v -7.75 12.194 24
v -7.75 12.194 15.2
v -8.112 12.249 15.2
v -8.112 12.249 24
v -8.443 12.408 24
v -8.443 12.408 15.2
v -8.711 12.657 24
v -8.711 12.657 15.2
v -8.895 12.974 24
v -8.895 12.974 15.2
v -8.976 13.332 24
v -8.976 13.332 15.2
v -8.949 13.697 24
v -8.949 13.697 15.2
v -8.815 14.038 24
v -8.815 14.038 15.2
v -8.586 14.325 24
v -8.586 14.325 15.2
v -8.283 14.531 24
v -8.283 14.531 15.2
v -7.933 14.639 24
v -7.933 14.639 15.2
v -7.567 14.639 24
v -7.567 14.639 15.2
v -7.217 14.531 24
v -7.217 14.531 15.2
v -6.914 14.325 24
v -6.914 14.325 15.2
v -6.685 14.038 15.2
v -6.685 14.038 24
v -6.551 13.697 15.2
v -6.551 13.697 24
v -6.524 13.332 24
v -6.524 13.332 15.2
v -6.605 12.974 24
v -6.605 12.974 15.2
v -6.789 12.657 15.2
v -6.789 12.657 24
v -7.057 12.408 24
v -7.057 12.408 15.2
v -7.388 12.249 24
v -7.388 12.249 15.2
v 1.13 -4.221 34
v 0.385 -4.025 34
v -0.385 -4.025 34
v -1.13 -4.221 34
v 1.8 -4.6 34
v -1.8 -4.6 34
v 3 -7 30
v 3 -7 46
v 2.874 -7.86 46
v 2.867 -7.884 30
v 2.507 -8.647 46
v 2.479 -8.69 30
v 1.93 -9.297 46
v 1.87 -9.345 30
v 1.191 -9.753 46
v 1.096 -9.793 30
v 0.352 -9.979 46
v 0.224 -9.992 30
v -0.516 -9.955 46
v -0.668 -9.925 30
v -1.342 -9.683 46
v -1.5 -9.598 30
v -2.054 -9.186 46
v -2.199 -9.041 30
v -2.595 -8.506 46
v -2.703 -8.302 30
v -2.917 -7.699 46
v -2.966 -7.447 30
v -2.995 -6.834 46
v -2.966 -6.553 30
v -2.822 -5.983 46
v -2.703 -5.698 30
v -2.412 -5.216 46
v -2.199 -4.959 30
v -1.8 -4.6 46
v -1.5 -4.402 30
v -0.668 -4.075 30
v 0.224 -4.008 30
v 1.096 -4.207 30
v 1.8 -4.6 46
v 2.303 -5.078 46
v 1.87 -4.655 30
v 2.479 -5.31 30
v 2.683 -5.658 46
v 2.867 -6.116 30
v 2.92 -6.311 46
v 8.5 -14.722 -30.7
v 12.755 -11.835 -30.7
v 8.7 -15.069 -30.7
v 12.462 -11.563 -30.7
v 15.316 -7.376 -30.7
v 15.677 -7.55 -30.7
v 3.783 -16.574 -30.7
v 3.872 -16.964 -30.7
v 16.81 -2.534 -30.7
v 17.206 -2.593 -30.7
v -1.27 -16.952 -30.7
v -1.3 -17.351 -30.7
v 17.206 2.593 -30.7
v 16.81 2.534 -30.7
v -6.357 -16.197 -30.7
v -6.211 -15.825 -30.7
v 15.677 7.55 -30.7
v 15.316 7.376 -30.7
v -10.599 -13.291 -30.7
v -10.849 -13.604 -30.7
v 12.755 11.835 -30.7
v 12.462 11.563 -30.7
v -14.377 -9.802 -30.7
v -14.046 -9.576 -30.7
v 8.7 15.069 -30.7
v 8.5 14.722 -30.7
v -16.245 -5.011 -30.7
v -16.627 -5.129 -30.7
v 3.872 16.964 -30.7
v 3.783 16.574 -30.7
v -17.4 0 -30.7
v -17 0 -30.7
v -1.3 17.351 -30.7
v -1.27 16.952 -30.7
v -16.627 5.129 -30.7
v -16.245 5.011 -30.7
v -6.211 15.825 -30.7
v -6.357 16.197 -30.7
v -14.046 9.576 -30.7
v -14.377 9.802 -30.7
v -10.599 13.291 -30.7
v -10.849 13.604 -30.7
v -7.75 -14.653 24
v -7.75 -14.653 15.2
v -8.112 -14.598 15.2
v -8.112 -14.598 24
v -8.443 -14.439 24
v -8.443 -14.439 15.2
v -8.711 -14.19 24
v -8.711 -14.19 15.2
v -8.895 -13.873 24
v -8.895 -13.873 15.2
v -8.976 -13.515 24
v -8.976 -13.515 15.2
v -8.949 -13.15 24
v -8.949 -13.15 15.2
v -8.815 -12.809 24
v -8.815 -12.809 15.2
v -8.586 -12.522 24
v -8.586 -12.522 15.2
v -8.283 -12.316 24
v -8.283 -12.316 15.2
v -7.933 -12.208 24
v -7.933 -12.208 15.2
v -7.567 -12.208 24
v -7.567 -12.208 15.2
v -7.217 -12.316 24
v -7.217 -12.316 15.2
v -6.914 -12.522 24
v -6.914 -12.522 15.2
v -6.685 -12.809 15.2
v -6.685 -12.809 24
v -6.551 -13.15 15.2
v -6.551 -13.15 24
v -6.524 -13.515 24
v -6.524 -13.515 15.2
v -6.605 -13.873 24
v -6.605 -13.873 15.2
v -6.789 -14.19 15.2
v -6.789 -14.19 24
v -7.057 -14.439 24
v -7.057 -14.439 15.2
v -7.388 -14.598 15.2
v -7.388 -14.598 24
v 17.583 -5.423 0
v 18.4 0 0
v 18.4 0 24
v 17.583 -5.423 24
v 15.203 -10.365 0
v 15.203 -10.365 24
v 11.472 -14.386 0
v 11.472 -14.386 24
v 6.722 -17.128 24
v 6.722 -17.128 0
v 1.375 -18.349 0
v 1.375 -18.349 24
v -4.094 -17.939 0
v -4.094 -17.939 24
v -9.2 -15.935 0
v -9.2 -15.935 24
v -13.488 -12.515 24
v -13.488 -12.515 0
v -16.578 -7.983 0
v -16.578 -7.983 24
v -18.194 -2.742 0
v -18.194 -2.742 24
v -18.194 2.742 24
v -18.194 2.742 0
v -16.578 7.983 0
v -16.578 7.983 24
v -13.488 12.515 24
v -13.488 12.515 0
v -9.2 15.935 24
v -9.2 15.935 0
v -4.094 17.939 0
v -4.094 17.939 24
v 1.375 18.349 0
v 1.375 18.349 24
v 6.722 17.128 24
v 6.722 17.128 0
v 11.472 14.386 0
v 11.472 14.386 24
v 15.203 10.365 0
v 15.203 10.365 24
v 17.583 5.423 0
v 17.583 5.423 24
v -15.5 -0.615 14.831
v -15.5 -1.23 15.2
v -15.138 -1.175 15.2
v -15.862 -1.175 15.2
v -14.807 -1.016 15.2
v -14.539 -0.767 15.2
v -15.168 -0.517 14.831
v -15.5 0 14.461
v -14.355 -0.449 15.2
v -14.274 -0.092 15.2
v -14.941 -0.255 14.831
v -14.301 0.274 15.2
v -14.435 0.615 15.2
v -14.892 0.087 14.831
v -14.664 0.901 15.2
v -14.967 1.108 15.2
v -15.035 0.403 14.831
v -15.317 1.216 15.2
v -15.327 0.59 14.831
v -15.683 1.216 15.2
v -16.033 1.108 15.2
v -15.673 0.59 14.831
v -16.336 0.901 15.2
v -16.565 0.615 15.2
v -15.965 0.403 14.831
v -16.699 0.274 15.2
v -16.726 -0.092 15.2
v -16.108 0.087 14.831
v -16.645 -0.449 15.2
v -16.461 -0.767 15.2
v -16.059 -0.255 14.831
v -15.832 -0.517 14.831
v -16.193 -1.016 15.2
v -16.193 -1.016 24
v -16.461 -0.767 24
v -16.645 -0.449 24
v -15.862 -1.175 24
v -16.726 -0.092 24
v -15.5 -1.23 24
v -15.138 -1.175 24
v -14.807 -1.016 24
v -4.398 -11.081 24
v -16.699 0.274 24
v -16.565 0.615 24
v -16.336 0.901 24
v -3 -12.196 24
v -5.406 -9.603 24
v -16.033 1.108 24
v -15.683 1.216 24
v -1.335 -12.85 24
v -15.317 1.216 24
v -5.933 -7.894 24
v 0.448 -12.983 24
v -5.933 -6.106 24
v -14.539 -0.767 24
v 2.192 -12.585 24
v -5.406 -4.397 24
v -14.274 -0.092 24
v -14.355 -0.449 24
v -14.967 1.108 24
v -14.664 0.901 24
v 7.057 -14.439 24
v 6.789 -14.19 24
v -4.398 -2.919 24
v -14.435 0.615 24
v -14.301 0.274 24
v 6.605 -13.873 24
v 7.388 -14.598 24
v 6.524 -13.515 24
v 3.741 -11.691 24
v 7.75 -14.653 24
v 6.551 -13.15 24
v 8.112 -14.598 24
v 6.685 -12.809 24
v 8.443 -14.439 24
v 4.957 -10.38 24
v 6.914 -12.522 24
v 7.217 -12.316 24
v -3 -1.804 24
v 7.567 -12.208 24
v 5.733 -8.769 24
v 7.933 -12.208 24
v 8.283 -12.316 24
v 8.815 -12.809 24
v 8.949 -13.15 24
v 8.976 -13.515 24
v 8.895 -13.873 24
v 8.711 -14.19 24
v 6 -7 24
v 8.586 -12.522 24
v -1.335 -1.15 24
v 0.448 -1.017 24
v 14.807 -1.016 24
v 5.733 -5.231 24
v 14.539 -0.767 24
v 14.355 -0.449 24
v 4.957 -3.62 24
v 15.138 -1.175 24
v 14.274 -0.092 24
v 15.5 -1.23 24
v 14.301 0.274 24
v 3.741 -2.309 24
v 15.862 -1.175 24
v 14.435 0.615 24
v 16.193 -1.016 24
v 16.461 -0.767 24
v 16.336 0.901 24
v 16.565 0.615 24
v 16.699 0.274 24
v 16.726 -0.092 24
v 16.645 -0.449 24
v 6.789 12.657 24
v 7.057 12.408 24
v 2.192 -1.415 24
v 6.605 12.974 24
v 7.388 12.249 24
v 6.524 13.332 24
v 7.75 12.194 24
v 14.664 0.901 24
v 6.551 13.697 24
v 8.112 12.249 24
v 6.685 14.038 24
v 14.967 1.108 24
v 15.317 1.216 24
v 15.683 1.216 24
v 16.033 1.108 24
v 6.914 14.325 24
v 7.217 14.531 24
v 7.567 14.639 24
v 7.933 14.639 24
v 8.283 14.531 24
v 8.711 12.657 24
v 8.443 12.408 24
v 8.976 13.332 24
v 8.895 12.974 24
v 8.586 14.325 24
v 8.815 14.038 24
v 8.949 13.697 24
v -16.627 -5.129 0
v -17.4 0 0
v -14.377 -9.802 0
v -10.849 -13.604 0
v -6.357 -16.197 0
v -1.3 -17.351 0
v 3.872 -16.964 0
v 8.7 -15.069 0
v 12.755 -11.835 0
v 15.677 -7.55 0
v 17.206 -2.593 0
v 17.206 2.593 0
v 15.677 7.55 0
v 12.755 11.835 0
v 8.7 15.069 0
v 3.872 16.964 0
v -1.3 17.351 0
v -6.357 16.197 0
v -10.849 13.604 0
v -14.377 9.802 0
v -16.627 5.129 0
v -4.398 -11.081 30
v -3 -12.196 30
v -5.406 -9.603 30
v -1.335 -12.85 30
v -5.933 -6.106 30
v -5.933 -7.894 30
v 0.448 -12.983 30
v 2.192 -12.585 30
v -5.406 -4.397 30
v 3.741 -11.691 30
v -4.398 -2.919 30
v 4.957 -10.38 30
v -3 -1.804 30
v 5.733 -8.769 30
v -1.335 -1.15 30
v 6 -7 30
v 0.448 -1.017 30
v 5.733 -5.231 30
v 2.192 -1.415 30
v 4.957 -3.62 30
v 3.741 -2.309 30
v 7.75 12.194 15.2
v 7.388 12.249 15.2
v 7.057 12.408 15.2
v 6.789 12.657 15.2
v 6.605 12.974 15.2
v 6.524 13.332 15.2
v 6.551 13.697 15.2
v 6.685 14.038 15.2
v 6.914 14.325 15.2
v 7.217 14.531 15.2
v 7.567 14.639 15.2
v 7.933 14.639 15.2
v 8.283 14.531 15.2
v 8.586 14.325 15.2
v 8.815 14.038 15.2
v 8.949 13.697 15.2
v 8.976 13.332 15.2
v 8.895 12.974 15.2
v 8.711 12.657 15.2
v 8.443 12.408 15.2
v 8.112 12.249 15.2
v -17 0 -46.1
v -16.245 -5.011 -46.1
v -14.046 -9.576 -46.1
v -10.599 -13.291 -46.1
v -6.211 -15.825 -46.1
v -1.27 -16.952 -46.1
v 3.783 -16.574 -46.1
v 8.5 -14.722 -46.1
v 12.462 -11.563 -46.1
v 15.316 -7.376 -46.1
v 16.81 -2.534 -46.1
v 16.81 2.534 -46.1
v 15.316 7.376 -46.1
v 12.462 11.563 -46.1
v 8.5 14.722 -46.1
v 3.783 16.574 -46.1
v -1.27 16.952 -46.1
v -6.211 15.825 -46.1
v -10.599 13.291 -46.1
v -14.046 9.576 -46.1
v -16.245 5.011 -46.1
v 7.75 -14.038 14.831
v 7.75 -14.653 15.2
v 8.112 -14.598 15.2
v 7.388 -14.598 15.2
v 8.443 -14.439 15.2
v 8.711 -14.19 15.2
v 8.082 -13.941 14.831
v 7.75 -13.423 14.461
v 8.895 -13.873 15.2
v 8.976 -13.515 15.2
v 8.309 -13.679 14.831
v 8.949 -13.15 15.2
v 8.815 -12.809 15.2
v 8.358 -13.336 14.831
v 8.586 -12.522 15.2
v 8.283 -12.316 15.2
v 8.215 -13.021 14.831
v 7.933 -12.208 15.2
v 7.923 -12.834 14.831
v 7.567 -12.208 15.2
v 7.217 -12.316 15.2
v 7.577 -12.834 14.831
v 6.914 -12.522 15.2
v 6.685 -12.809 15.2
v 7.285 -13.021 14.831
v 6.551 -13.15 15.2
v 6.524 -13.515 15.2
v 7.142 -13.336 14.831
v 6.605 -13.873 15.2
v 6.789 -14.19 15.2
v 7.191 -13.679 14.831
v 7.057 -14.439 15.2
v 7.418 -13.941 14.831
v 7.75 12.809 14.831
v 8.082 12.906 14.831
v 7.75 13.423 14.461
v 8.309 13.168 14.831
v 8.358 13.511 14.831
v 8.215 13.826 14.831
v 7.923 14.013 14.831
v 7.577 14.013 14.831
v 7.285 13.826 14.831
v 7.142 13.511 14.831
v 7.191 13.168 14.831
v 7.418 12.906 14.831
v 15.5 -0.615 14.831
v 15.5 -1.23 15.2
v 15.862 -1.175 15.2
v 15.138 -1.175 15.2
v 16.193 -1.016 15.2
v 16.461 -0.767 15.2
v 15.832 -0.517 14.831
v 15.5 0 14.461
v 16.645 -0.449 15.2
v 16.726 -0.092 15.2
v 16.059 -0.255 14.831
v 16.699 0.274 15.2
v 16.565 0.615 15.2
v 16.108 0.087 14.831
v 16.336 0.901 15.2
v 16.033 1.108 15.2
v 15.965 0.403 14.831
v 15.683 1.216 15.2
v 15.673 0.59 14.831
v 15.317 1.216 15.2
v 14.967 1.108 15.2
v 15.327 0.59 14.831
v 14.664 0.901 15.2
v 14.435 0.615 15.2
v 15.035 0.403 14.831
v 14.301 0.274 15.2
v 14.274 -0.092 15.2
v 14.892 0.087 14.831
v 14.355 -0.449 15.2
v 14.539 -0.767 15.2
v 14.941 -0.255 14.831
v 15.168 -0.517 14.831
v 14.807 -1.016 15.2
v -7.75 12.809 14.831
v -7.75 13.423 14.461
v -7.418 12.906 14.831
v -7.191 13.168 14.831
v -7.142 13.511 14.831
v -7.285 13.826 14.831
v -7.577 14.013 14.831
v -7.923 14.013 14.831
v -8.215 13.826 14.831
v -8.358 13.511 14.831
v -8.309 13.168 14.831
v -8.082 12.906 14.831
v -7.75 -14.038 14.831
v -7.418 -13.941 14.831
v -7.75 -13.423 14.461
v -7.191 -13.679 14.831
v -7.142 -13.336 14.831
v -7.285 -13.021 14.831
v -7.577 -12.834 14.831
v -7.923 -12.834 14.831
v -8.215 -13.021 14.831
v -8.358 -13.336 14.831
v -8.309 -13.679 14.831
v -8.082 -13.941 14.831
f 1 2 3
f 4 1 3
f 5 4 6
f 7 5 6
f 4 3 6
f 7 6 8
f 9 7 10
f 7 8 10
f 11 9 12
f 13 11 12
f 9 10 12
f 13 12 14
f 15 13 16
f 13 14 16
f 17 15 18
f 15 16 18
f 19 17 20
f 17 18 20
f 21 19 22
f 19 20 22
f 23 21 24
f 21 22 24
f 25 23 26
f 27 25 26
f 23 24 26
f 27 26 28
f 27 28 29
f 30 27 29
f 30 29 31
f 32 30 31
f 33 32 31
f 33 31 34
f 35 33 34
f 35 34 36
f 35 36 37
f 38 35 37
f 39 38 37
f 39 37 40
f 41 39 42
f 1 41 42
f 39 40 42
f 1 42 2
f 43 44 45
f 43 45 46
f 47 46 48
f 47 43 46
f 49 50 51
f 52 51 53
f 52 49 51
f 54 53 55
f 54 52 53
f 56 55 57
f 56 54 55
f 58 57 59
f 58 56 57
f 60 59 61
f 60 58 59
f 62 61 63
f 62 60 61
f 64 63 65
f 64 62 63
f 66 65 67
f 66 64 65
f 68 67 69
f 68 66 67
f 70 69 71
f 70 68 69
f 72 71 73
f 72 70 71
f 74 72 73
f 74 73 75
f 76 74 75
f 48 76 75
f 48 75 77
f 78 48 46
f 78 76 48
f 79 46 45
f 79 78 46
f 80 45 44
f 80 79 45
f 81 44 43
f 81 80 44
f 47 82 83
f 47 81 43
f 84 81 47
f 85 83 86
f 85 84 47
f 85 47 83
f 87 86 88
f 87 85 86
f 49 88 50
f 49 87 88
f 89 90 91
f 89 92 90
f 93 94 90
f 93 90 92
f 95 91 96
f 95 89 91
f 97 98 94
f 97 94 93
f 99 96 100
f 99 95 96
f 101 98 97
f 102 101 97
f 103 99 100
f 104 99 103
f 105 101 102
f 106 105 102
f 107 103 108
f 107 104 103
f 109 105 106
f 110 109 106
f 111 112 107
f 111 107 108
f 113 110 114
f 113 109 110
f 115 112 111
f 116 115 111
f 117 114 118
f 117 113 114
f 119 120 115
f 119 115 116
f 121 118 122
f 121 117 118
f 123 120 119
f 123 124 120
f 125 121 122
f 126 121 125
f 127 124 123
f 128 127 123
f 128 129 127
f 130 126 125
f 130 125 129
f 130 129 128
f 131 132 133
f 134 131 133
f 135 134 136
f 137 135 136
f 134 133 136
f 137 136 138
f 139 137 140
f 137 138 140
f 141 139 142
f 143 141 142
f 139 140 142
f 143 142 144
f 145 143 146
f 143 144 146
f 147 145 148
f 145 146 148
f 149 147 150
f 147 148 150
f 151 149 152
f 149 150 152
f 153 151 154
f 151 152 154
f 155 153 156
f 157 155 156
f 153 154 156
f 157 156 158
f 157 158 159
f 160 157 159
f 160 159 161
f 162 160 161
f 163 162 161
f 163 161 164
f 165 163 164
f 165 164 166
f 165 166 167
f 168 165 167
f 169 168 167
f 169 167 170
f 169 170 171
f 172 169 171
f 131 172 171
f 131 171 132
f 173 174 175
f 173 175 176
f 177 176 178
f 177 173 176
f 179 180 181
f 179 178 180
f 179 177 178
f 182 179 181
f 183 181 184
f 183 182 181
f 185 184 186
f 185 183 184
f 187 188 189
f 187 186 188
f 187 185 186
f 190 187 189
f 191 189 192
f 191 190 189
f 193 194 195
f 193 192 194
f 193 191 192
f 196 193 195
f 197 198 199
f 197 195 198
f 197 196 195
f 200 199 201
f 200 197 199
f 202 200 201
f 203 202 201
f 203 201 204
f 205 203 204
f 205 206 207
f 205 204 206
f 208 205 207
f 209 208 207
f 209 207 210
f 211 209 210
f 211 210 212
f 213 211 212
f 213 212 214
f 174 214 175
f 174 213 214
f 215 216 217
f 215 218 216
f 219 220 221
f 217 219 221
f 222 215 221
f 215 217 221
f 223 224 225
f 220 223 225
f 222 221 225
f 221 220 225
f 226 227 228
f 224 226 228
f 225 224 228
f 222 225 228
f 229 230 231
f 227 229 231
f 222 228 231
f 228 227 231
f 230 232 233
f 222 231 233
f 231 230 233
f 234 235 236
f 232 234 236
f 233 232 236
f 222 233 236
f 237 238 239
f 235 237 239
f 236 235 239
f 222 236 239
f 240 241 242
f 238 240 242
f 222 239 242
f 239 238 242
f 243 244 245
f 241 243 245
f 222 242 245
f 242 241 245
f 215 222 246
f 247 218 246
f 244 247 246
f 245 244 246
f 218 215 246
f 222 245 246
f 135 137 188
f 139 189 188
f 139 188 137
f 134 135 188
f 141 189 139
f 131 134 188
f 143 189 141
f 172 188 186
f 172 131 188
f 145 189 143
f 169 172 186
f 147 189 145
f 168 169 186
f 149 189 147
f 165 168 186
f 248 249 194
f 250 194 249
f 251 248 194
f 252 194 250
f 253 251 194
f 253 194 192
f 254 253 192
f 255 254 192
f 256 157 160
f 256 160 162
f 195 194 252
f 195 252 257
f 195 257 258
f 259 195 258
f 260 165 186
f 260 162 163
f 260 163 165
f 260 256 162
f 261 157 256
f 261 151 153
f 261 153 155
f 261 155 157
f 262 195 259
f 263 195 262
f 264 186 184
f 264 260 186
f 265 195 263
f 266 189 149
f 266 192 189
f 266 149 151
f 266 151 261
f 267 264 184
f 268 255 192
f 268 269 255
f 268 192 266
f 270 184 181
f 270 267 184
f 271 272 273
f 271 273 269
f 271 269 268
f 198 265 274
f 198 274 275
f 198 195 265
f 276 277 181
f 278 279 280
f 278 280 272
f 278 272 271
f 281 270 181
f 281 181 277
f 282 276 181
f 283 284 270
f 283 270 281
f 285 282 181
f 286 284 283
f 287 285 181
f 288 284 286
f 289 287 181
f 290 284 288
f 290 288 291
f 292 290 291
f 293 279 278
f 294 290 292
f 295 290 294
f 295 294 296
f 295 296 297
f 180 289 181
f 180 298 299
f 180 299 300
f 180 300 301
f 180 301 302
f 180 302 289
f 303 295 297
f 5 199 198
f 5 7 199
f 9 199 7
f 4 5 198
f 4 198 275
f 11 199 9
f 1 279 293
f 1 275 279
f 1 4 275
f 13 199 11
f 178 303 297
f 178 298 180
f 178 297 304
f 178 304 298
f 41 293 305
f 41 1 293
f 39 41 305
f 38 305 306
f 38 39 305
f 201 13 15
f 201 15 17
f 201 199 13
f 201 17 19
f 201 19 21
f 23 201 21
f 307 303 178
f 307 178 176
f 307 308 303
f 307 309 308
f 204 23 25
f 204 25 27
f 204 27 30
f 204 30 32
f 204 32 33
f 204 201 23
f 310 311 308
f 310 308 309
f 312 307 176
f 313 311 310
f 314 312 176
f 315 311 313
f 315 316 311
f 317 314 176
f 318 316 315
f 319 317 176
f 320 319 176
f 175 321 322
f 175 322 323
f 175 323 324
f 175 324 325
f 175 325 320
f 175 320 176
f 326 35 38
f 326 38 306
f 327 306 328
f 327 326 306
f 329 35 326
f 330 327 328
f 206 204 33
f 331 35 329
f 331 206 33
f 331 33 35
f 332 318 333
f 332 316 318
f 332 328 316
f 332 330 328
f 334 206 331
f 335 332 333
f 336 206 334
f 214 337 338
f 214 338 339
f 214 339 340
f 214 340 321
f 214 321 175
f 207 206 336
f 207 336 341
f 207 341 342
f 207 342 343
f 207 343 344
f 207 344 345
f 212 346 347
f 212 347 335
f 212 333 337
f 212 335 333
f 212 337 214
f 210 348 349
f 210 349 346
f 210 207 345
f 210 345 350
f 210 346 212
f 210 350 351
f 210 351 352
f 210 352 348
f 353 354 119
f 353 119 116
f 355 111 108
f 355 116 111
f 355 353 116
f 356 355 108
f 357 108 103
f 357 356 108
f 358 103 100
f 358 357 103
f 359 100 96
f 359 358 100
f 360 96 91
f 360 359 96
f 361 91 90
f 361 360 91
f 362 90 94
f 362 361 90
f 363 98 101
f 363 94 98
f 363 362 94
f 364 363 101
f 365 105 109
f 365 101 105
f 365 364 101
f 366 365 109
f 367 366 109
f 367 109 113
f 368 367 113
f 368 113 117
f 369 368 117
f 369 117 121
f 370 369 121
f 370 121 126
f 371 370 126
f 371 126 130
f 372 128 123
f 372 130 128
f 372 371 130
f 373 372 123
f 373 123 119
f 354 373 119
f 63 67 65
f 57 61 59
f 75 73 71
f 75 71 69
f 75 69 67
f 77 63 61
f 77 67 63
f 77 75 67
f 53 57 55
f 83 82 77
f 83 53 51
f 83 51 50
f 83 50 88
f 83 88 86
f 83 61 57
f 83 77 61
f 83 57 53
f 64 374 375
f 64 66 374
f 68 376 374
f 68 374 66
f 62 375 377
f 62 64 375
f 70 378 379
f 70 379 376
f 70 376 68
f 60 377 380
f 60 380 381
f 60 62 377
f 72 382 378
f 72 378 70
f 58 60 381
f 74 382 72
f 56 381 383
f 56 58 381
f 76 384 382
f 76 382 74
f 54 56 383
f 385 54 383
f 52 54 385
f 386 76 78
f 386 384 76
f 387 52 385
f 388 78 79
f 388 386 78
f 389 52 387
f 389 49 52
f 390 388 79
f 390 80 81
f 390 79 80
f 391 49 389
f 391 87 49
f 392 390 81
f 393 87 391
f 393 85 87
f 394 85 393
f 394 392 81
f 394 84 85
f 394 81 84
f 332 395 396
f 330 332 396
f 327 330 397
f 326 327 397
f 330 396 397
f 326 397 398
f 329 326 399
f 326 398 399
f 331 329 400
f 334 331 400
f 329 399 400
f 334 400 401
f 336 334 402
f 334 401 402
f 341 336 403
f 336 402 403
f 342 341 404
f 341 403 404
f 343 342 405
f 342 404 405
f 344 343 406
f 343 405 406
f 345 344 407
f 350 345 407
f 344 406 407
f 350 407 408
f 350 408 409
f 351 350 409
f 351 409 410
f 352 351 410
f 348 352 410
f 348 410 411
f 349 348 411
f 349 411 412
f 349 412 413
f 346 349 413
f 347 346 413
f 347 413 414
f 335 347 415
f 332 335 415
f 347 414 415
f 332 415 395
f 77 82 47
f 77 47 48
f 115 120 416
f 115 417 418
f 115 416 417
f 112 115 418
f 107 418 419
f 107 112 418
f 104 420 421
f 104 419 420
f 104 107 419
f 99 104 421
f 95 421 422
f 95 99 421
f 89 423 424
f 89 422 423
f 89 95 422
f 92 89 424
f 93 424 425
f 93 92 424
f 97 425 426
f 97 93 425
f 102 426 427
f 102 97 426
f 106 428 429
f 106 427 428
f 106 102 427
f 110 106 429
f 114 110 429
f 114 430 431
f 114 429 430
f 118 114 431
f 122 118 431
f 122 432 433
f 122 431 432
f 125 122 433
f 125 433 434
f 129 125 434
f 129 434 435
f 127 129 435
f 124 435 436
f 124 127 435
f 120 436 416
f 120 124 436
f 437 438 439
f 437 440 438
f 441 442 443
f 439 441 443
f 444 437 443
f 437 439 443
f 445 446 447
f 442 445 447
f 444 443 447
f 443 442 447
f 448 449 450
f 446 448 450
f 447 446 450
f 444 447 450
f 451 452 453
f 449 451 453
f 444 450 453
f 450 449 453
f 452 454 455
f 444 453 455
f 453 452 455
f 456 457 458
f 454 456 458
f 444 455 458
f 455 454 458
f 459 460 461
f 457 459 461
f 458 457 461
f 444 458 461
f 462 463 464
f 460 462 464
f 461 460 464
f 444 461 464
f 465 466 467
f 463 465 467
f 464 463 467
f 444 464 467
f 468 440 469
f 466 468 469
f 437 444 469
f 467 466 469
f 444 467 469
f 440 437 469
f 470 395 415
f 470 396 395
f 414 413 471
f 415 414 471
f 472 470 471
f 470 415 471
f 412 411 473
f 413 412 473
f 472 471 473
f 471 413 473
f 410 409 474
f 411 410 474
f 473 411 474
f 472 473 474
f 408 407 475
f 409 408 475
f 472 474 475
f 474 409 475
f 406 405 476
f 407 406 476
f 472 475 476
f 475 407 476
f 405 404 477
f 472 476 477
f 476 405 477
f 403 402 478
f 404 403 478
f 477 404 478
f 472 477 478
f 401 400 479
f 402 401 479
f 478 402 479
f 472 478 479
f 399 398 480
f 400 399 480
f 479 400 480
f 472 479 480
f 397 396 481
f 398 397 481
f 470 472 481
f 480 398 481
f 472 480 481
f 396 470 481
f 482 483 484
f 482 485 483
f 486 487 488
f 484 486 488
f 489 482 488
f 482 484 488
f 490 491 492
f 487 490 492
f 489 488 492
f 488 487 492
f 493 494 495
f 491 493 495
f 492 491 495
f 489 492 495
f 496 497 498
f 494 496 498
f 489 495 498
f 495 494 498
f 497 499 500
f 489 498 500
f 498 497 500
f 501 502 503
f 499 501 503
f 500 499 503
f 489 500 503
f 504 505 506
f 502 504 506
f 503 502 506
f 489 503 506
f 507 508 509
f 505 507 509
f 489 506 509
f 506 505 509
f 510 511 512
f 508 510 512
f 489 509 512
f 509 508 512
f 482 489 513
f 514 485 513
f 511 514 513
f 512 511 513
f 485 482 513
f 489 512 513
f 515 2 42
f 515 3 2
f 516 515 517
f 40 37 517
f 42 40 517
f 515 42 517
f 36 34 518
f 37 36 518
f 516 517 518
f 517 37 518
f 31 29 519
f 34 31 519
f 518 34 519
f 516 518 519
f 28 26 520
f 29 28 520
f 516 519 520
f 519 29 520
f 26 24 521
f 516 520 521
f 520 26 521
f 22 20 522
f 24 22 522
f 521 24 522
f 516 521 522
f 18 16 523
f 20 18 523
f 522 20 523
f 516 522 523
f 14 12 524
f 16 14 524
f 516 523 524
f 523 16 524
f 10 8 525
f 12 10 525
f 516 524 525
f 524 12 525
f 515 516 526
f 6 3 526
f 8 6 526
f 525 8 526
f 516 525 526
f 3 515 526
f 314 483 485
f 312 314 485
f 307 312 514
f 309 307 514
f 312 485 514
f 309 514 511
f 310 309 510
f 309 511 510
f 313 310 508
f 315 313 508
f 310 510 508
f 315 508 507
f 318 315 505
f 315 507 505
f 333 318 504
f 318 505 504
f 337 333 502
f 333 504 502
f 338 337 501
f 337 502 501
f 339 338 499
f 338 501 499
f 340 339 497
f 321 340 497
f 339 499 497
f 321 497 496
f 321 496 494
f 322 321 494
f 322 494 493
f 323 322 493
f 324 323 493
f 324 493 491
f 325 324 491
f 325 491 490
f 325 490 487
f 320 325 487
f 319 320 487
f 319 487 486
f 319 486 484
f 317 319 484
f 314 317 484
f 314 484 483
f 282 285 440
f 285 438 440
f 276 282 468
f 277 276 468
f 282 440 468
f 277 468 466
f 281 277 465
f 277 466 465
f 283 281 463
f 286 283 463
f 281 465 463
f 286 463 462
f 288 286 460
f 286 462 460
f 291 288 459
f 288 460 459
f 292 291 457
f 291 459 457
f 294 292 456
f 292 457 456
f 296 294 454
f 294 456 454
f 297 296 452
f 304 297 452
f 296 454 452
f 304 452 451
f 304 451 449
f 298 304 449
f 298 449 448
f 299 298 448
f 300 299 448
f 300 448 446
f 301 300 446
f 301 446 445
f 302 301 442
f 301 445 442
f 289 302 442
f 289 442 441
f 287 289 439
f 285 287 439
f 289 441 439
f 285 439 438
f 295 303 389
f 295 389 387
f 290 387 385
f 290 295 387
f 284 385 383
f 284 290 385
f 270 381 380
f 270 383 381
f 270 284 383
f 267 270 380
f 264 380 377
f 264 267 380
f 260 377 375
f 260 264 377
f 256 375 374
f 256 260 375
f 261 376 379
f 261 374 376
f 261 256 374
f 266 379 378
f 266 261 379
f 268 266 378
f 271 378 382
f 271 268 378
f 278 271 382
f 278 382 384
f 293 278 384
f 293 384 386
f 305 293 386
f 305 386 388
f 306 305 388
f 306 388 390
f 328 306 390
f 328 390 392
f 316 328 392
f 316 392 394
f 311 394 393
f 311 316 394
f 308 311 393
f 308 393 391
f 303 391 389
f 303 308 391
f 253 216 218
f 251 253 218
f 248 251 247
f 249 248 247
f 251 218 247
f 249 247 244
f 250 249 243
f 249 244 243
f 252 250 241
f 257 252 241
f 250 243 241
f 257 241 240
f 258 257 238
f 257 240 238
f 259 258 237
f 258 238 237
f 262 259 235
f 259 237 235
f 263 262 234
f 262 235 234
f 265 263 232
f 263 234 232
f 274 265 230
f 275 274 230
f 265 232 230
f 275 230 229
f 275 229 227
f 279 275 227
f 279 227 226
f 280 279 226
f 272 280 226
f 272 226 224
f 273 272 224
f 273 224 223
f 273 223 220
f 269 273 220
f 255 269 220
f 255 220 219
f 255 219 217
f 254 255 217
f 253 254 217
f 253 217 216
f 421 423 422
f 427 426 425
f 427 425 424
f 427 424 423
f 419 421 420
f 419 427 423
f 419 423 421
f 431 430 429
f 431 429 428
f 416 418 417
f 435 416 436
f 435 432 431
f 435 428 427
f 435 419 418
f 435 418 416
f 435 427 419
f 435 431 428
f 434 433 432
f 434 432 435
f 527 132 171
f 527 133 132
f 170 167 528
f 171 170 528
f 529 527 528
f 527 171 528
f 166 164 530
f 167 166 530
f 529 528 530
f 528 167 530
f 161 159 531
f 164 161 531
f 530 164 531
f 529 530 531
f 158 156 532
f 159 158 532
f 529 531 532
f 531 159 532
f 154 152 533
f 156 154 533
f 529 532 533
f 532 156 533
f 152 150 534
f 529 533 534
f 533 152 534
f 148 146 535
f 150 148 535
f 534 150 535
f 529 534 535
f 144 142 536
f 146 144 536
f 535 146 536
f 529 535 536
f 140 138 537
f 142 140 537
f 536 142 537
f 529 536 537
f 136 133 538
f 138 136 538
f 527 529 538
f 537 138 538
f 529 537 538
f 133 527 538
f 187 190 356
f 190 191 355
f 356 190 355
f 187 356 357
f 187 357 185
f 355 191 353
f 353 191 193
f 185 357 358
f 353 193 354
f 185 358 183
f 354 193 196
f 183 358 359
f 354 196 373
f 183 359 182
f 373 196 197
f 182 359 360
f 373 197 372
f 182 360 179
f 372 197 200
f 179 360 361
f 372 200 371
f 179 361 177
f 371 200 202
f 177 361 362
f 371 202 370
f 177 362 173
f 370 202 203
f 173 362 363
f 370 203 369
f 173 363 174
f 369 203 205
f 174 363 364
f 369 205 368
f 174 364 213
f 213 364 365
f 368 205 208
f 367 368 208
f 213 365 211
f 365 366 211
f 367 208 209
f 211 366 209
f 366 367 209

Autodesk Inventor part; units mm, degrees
ref_plane "YZ Plane" through (0, 0, 0) normal (1, 0, 0) x (0, 1, 0)
ref_plane "XZ Plane" through (0, 0, 0) normal (0, 1, 0) x (-1, 0, 0)
ref_plane "XY Plane" through (0, 0, 0) normal (0, 0, 1) x (1, 0, 0)
sketch "スケッチ1" plane through (0, 0, 0) normal (0, 0, 1) x (1, 0, 0)
  circle A0 centre (0, 0) radius 18.4
extrude "押し出し1" add sketch "スケッチ1" along normal blind 24
sketch "スケッチ2" plane through (0, 0, 0) normal (0, 0, -1) x (-1, 0, 0)
  circle A0 centre (0, 0) radius 17.4
  dimension "d3" = 34.8
extrude "押し出し2" add sketch "スケッチ2" along normal blind 30.7
sketch "スケッチ3" plane through (0, 0, -30.7) normal (0, 0, -1) x (-1, 0, 0)
  circle A0 centre (0, 0) radius 17
  dimension "d6" = 34
extrude "押し出し3" add sketch "スケッチ3" along normal blind 15.4
sketch "スケッチ4" plane through (0, 0, 24) normal (0, 0, 1) x (1, 0, 0)
  circle A0 centre (0, -7) radius 6
  circle A1 centre (0, -7) radius 3
  point P0 (0, 0)
  point P1 (-15.5, 0)
  point P2 (0, 0)
  point P3 (-7.75, -13.4234)
  point P4 (7.75, -13.4234)
  point P5 (15.5, 0)
  point P6 (7.75, 13.4234)
  point P7 (-7.75, 13.4234)
  dimension "d11" = 360
  dimension "d13" = 15.5
  dimension "d14" = 7
  dimension "d15" = 12
  dimension "d16" = 6
extrude "押し出し4" add sketch "スケッチ4" along normal blind 6
extrude "押し出し5" add sketch "スケッチ4" along normal blind 22 contours A1
sketch "スケッチ5" plane through (0, -7, 46) normal (0, 0, 1) x (1, 0, 0)
  circle A0 centre (0, 0) radius 3
  line L0 (0, 2.4) -> (1.8, 2.4)
  line L1 (0, 2.4) -> (-1.8, 2.4)
  point P0 (0, 7)
  dimension "d21" = 6
  dimension "d22" = 2.4
extrude "押し出し6" cut sketch "スケッチ5" against normal blind 12 contours L0 L1 A0 picked at (-1.016, 2.5094)
sketch "スケッチ6" plane through (0, 0, 24) normal (0, 0, 1) x (1, 0, 0)
  point P0 (0, 0)
  point P1 (-15.5, 0)
  point P2 (-7.75, -13.4234)
  point P3 (7.75, -13.4234)
  point P4 (15.5, 0)
  point P5 (7.75, 13.4234)
  point P6 (-7.75, 13.4234)
  dimension "d25" = 15.5
  dimension "d28" = 360
hole "穴1" at (7.75, 13.4234, 24) at (-7.75, 13.4234, 24) at (-15.5, 0, 24) at (-7.75, -13.4234, 24) at (7.75, -13.4234, 24) at (15.5, 0, 24) direction (0, 0, -1) diameter 2.459 depth 8.8 tip angle 118 thread size "M3x0.5" class "6H" standard "ISO Metric profile"
properties part number "Metal Gearmotor"
